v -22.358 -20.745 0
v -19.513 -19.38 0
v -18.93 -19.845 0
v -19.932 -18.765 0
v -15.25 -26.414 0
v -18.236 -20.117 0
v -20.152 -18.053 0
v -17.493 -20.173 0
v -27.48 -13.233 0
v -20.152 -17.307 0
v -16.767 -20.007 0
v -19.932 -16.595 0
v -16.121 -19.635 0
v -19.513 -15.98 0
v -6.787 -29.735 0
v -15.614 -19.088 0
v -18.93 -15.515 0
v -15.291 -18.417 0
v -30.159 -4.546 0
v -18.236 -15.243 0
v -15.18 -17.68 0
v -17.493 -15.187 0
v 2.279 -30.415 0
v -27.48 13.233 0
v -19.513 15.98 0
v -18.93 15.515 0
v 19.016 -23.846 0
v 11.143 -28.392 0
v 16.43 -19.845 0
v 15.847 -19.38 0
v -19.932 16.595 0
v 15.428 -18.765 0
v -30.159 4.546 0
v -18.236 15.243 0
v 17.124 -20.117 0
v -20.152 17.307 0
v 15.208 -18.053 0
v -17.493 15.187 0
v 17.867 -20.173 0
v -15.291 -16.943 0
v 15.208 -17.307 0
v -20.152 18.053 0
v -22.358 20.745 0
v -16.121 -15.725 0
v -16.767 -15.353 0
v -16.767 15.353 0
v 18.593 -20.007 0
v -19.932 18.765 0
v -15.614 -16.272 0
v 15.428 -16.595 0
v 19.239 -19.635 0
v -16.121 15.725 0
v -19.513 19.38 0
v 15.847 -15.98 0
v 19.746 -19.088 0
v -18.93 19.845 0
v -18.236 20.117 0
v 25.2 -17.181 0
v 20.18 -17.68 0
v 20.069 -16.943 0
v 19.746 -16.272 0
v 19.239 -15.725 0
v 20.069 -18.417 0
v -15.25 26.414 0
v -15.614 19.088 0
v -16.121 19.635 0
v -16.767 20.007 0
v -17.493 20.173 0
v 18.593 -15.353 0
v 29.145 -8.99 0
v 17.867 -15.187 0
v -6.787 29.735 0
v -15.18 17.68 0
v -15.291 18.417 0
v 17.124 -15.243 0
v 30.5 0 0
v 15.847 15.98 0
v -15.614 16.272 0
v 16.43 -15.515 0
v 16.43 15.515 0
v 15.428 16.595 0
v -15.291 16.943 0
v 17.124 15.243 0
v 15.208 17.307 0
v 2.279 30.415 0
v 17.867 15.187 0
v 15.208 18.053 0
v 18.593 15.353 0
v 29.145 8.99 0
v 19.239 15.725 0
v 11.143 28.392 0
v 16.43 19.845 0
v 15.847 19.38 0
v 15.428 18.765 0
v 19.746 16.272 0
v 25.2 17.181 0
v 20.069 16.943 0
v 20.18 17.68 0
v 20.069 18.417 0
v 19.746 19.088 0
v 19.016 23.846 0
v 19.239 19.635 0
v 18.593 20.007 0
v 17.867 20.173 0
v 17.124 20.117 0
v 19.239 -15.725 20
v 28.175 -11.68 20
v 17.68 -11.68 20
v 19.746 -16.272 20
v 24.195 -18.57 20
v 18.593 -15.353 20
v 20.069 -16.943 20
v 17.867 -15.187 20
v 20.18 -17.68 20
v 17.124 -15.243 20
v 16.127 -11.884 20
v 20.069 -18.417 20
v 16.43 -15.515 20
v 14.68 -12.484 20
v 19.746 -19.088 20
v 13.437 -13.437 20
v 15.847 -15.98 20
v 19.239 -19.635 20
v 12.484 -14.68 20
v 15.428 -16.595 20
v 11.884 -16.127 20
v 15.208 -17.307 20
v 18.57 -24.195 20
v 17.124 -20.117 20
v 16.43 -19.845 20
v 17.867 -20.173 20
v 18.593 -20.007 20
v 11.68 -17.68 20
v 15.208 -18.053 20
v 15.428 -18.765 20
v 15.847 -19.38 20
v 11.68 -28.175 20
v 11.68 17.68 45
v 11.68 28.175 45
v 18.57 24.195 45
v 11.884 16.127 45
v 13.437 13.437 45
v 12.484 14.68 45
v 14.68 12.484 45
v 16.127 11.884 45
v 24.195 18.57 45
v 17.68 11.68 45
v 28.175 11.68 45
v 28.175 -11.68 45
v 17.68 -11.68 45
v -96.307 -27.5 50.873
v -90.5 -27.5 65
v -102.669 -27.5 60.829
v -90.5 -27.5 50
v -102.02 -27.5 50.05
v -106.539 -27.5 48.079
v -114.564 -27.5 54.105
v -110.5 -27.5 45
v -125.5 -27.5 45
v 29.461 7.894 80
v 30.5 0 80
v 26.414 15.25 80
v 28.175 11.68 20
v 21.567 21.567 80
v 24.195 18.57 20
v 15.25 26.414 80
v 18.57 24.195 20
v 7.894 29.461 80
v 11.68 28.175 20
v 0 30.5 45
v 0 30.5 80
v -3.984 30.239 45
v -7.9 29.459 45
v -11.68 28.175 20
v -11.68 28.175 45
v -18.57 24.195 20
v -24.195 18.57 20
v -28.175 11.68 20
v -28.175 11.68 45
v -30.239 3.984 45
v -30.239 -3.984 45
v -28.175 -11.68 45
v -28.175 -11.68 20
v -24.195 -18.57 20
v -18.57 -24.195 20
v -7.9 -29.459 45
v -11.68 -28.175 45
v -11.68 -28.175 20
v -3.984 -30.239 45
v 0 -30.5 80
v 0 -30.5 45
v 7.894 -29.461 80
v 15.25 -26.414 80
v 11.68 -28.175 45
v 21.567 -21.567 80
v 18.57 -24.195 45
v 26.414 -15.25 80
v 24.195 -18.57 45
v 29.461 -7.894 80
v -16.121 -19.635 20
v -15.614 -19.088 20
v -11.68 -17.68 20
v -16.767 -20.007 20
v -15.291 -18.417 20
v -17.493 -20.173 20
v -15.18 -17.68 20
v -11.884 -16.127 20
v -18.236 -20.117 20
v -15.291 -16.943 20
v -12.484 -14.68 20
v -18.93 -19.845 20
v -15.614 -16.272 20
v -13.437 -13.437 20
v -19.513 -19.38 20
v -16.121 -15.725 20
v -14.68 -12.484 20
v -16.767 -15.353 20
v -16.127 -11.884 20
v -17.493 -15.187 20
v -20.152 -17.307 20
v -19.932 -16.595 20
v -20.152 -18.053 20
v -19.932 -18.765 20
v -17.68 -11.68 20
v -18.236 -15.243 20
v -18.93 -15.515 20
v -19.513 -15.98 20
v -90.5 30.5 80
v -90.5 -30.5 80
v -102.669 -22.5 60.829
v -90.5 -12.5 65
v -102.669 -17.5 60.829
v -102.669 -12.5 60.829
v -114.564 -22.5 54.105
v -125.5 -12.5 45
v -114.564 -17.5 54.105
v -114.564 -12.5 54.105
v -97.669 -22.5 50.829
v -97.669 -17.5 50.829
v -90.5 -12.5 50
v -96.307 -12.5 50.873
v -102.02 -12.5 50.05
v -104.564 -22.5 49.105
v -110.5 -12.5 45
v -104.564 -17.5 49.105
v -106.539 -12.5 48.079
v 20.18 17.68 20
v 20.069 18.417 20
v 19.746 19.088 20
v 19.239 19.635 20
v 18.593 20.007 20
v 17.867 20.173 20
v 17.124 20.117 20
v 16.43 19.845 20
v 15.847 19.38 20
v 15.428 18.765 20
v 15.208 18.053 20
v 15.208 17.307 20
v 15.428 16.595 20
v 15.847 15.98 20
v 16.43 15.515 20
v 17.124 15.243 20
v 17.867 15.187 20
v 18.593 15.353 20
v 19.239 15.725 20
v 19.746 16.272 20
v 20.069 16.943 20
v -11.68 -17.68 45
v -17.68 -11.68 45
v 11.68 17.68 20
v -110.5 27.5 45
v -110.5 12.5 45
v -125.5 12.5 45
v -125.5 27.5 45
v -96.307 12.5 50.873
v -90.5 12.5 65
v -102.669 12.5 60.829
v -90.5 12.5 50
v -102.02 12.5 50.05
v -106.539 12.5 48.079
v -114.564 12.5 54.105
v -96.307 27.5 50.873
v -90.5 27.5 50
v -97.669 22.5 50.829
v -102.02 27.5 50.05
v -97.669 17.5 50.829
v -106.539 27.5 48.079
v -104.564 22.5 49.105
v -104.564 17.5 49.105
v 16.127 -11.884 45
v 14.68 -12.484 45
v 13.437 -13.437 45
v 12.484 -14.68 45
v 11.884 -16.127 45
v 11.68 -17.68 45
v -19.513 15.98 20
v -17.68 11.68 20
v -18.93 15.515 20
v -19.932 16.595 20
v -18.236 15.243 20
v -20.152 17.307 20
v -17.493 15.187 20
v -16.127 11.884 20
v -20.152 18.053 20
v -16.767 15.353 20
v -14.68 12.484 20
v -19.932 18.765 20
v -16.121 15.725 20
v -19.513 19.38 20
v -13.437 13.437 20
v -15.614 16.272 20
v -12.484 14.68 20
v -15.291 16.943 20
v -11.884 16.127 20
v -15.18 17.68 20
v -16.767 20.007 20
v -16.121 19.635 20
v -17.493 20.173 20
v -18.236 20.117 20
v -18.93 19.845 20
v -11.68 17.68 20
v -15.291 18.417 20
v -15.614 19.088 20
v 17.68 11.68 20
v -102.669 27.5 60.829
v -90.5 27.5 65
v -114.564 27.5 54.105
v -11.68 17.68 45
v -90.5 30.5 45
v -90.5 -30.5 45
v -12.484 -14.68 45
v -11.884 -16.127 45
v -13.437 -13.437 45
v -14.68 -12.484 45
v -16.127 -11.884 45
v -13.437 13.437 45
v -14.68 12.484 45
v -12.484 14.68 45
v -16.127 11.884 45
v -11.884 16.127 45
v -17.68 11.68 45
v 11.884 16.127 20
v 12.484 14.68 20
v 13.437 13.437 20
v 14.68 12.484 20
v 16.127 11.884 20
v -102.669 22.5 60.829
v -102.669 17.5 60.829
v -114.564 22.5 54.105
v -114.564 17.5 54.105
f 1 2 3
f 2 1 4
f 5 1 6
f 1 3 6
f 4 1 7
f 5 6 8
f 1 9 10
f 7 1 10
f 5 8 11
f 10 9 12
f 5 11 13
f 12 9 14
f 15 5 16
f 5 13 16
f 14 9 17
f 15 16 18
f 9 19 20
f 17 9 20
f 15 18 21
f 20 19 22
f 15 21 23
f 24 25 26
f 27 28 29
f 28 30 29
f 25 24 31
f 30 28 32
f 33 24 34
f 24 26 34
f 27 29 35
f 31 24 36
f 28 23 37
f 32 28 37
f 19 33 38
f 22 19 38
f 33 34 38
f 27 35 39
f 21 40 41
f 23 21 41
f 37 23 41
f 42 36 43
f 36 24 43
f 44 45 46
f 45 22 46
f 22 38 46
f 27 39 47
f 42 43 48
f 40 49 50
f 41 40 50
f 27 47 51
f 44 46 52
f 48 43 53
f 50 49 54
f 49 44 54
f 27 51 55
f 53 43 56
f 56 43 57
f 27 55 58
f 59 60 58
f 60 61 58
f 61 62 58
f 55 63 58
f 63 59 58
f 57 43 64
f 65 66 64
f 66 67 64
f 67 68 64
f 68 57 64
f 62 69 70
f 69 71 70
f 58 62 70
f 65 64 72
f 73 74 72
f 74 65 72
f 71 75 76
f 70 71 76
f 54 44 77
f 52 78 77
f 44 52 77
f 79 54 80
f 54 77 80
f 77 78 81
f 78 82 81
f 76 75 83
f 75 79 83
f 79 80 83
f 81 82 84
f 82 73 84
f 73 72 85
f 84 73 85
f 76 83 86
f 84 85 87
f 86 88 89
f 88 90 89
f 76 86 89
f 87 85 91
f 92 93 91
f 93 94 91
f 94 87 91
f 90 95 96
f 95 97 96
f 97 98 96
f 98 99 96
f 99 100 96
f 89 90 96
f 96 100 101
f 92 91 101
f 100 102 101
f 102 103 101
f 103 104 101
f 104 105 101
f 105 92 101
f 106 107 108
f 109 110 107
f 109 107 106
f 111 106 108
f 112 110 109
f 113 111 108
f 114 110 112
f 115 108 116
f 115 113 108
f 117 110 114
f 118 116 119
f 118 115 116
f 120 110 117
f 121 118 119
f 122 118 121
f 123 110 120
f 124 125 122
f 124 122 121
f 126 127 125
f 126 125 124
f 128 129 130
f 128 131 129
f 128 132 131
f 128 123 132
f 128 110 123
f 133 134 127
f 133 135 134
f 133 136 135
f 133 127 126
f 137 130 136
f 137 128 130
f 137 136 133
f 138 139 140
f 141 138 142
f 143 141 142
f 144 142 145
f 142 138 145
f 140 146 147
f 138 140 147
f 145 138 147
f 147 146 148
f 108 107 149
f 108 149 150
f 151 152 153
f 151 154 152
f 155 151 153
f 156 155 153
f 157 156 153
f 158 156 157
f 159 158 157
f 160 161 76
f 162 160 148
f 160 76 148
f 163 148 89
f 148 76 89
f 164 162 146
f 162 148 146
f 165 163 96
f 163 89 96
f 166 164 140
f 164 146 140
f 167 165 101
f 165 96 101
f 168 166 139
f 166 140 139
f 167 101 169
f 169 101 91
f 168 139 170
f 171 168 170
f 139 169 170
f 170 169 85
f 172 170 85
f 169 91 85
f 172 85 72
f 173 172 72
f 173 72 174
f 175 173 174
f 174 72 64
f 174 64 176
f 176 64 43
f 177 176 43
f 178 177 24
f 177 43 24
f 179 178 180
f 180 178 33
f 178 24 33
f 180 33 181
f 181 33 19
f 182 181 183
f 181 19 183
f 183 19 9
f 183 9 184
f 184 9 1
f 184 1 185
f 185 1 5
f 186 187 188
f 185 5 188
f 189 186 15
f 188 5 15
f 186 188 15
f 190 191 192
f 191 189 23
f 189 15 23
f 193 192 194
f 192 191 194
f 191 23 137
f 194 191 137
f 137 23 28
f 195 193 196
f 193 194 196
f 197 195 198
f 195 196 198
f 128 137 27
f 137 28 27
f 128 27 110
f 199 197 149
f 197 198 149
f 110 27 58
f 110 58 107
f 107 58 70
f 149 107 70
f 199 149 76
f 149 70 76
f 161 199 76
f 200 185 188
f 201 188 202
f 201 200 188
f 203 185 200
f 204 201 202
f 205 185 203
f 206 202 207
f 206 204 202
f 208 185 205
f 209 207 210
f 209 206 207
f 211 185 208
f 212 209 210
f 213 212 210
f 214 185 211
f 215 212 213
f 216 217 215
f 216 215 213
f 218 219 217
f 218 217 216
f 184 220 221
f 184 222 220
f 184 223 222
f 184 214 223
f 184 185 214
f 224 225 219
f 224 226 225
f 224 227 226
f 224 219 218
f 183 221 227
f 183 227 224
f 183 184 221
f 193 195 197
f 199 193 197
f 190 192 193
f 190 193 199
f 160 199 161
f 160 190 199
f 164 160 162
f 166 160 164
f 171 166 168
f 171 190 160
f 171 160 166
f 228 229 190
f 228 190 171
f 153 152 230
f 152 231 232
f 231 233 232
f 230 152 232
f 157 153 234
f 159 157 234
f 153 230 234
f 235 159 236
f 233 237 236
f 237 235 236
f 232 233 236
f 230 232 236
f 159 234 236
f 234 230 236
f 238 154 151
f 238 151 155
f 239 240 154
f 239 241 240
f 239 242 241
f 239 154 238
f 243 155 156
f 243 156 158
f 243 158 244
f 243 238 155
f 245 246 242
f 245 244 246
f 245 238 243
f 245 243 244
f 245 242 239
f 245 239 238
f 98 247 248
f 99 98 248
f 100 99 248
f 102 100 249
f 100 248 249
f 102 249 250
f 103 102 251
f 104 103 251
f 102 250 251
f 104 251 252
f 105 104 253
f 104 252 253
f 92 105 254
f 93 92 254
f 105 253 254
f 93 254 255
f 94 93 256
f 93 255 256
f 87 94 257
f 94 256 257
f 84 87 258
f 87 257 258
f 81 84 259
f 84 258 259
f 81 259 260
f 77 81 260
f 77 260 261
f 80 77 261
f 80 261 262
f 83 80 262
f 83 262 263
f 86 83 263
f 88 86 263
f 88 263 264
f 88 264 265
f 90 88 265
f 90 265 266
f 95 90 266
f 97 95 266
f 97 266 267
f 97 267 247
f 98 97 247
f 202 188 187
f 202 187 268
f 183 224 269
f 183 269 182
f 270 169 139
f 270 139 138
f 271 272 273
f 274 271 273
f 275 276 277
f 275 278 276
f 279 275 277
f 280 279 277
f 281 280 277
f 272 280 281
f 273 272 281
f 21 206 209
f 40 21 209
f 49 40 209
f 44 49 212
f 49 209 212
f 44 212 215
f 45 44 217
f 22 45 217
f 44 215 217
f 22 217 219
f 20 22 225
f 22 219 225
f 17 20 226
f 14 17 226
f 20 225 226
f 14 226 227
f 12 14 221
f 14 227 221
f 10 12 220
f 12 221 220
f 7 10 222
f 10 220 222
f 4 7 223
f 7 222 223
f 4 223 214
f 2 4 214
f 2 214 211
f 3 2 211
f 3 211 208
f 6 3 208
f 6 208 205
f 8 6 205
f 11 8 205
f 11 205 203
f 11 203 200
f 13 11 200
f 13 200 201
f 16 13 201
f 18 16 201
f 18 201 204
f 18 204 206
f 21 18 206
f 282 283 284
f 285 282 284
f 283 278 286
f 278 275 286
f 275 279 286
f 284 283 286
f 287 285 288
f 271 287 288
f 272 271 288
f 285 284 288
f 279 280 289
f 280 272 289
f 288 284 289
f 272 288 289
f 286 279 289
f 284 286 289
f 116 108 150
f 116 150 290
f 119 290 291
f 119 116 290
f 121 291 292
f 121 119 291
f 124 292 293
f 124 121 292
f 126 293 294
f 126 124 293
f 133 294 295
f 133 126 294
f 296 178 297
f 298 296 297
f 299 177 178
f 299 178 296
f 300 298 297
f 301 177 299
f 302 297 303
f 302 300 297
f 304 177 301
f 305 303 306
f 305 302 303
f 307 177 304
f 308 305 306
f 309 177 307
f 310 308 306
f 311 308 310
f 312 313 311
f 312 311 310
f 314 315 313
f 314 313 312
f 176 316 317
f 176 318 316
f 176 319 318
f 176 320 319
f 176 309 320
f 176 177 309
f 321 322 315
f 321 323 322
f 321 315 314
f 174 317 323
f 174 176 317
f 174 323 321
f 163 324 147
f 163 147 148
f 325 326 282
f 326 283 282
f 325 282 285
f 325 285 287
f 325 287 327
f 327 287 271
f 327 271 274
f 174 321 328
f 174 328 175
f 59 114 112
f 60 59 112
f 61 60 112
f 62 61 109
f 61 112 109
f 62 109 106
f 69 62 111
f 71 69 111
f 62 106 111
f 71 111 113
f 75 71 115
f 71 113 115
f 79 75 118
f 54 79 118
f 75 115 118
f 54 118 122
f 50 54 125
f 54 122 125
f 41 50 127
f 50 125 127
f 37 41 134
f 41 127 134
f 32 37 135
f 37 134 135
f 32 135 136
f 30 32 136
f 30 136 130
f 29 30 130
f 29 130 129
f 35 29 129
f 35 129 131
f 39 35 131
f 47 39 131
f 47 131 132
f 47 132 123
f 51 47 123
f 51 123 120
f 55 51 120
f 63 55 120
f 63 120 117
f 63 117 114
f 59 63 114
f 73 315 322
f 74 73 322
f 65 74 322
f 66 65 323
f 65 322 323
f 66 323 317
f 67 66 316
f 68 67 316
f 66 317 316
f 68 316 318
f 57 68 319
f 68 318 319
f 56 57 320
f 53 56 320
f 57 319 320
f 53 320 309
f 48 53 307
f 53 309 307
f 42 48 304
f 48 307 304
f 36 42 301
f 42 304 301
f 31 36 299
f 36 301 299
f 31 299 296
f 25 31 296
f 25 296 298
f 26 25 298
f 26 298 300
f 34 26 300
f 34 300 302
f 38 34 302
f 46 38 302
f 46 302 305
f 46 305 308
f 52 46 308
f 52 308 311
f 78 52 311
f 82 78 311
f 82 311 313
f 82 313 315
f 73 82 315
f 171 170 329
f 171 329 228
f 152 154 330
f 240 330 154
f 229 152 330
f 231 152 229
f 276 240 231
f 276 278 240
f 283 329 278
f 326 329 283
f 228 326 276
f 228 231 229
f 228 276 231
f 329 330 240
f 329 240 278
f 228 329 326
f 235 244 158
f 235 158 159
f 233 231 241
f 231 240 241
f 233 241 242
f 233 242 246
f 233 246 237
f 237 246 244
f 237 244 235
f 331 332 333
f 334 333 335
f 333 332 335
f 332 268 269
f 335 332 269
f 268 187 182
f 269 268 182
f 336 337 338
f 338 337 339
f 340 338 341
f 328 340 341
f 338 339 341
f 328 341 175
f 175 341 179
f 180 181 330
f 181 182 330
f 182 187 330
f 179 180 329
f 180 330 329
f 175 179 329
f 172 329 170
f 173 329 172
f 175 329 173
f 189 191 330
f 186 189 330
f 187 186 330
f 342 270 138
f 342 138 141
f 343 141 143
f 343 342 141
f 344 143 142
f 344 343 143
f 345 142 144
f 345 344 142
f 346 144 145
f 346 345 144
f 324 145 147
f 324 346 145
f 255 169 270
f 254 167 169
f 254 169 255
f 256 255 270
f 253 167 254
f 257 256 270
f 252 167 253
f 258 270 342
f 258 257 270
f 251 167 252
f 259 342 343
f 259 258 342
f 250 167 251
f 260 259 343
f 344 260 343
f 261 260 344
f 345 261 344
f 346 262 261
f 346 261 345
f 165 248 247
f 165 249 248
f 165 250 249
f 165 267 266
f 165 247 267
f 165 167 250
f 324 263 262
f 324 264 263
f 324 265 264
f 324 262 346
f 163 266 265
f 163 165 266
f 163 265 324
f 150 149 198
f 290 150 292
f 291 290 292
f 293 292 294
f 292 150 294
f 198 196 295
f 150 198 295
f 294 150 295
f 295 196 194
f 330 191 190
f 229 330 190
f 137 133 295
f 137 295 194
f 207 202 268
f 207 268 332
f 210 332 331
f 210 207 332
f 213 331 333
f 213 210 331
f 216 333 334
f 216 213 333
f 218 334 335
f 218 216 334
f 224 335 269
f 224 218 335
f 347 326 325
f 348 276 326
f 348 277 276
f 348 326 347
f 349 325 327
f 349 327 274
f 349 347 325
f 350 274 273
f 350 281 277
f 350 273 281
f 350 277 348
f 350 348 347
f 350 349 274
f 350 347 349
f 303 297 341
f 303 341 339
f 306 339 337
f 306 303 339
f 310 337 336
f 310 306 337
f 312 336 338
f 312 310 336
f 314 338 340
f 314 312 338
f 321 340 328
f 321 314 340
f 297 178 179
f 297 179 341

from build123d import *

# Parameters (mm, degrees)
SKETCH1_R                            = 30.5
BOSS_EXTRUDE1_DEPTH                  = 80
CUT_EXTRUDE1_REACH                   = 142.887
CUT_EXTRUDE1_START                   = -50
SKETCH2_R                            = 2.5
SKETCH7_W                            = 35
SKETCH7_H                            = 61
BOSS_EXTRUDE4_DEPTH                  = 60
BOSS_EXTRUDE4_DIRECTION_2_REACH      = 107.125
BOSS_EXTRUDE4_DIRECTION_2_END_RADIUS = 30.5
LOFT3_START                          = 12.5
LOFT3_DEPTH                          = 15
CUT_EXTRUDE2_START                   = -20
CUT_EXTRUDE2_DEPTH                   = 25
CIRPATTERN1_COUNT                    = 4


# Read off the part's stored shape, not the designer's step: Loft3
with BuildPart() as part:
    # Sketch1 → Boss-Extrude1 (new body)
    with BuildSketch(Plane.XY):
        Circle(SKETCH1_R)
    extrude(amount=BOSS_EXTRUDE1_DEPTH)

    # Sketch2 → Cut-Extrude1 (cut, up to next)
    with BuildSketch(Plane.XY.offset(80).offset(CUT_EXTRUDE1_START), mode=Mode.PRIVATE) as cut_extrude1_sk1:
        with Locations((17.68, -17.68)):
            Circle(SKETCH2_R)
    cut_extrude1_tool1 = extrude(cut_extrude1_sk1.sketch, amount=-CUT_EXTRUDE1_REACH, mode=Mode.PRIVATE) & part.part
    # Sketch2 → Cut-Extrude1 (cut, up to next)
    with BuildSketch(Plane.XY.offset(80).offset(CUT_EXTRUDE1_START), mode=Mode.PRIVATE) as cut_extrude1_sk2:
        with Locations((17.68, 17.68)):
            Circle(SKETCH2_R)
    cut_extrude1_tool2 = extrude(cut_extrude1_sk2.sketch, amount=-CUT_EXTRUDE1_REACH, mode=Mode.PRIVATE) & part.part
    # Sketch2 → Cut-Extrude1 (cut, up to next)
    with BuildSketch(Plane.XY.offset(80).offset(CUT_EXTRUDE1_START), mode=Mode.PRIVATE) as cut_extrude1_sk3:
        with Locations((-17.68, 17.68)):
            Circle(SKETCH2_R)
    cut_extrude1_tool3 = extrude(cut_extrude1_sk3.sketch, amount=-CUT_EXTRUDE1_REACH, mode=Mode.PRIVATE) & part.part
    # Sketch2 → Cut-Extrude1 (cut, up to next)
    with BuildSketch(Plane.XY.offset(80).offset(CUT_EXTRUDE1_START), mode=Mode.PRIVATE) as cut_extrude1_sk4:
        with Locations((-17.68, -17.68)):
            Circle(SKETCH2_R)
    cut_extrude1_tool4 = extrude(cut_extrude1_sk4.sketch, amount=-CUT_EXTRUDE1_REACH, mode=Mode.PRIVATE) & part.part
    add(cut_extrude1_tool1.solids().sort_by_distance((17.68, -17.68, 30))[0], mode=Mode.SUBTRACT)
    add(cut_extrude1_tool2.solids().sort_by_distance((17.68, 17.68, 30))[0], mode=Mode.SUBTRACT)
    add(cut_extrude1_tool3.solids().sort_by_distance((-17.68, 17.68, 30))[0], mode=Mode.SUBTRACT)
    add(cut_extrude1_tool4.solids().sort_by_distance((-17.68, -17.68, 30))[0], mode=Mode.SUBTRACT)

    # Sketch7 → Boss-Extrude4 (add)
    with BuildSketch(Plane.ZY.offset(30.5)):
        with Locations((62.5, 0)):
            Rectangle(SKETCH7_W, SKETCH7_H)
    extrude(amount=BOSS_EXTRUDE4_DEPTH)

    # Boss-Extrude4 direction 2: up to this cylinder (the profile starts outside it)
    boss_extrude4_direction_2_end = Plane(origin=(0, 0, 62.5), z_dir=(0, 0, -1)) * Cylinder(BOSS_EXTRUDE4_DIRECTION_2_END_RADIUS, 276.25, mode=Mode.PRIVATE)
    # Sketch7 → Boss-Extrude4 direction 2 (add, up to the surface)
    with BuildSketch(Plane.ZY.offset(30.5), mode=Mode.PRIVATE) as boss_extrude4_direction_2_sk1:
        with Locations((62.5, 0)):
            Rectangle(SKETCH7_W, SKETCH7_H)
    boss_extrude4_direction_2_tool1 = extrude(boss_extrude4_direction_2_sk1.sketch, amount=-BOSS_EXTRUDE4_DIRECTION_2_REACH, mode=Mode.PRIVATE) - boss_extrude4_direction_2_end
    add(boss_extrude4_direction_2_tool1.solids().sort_by_distance((-30.5, 0, 62.5))[0])
    add(boss_extrude4_direction_2_tool1.solids().sort_by_distance((-30.5, 0, 62.5))[1])

    # Loft3 outline → Loft3 (add)
    with BuildSketch(Plane(origin=(0, 0, 0), x_dir=(1, 0, 0), z_dir=(0, 1, 0)).offset(LOFT3_START)):
        with BuildLine():
            add(Edge.make_bspline(
                [(-90.5, -65), (-102.577141217, -62.16196551), (-115.272859166, -55.238036023), (-125.5, -45)],
                knots=[0, 0, 0, 0, 1, 1, 1, 1], degree=3))
            Line((-90.5, -65), (-90.5, -50))
            add(Edge.make_bspline(
                [(-90.5, -50), (-97.577141217, -52.16196551), (-105.272859166, -50.238036023), (-110.5, -45)],
                knots=[0, 0, 0, 0, 1, 1, 1, 1], degree=3))
            Line((-110.5, -45), (-125.5, -45))
        make_face()
    loft3 = extrude(amount=LOFT3_DEPTH)

    # Mirror1: Loft3 across plane
    add(loft3.mirror(Plane.ZX))

    # Sketch10 → Cut-Extrude2 (cut)
    with BuildSketch(Plane(origin=(0, 0, 0), x_dir=(-1, 0, 0), z_dir=(0, 0, -1)).offset(CUT_EXTRUDE2_START)):
        with BuildLine():
            Line((11.68, 17.68), (11.68, 28.174946318))
            ThreePointArc((11.68, 28.174946318), (21.566756826, 21.566756826), (28.174946318, 11.68))
            Line((28.174946318, 11.68), (17.68, 11.68))
            ThreePointArc((17.68, 11.68), (13.437359313, 13.437359313), (11.68, 17.68))
        make_face()
    cut_extrude2 = extrude(amount=-CUT_EXTRUDE2_DEPTH, mode=Mode.SUBTRACT)

    # CirPattern1: Cut-Extrude2 ×4 about axis
    cirpattern1_axis = Axis((0, 0, 0), (0, 0, 1))
    for i in range(1, CIRPATTERN1_COUNT):
        add(cut_extrude2.rotate(cirpattern1_axis, i * 360 / CIRPATTERN1_COUNT), mode=Mode.SUBTRACT)


solid = part.part
